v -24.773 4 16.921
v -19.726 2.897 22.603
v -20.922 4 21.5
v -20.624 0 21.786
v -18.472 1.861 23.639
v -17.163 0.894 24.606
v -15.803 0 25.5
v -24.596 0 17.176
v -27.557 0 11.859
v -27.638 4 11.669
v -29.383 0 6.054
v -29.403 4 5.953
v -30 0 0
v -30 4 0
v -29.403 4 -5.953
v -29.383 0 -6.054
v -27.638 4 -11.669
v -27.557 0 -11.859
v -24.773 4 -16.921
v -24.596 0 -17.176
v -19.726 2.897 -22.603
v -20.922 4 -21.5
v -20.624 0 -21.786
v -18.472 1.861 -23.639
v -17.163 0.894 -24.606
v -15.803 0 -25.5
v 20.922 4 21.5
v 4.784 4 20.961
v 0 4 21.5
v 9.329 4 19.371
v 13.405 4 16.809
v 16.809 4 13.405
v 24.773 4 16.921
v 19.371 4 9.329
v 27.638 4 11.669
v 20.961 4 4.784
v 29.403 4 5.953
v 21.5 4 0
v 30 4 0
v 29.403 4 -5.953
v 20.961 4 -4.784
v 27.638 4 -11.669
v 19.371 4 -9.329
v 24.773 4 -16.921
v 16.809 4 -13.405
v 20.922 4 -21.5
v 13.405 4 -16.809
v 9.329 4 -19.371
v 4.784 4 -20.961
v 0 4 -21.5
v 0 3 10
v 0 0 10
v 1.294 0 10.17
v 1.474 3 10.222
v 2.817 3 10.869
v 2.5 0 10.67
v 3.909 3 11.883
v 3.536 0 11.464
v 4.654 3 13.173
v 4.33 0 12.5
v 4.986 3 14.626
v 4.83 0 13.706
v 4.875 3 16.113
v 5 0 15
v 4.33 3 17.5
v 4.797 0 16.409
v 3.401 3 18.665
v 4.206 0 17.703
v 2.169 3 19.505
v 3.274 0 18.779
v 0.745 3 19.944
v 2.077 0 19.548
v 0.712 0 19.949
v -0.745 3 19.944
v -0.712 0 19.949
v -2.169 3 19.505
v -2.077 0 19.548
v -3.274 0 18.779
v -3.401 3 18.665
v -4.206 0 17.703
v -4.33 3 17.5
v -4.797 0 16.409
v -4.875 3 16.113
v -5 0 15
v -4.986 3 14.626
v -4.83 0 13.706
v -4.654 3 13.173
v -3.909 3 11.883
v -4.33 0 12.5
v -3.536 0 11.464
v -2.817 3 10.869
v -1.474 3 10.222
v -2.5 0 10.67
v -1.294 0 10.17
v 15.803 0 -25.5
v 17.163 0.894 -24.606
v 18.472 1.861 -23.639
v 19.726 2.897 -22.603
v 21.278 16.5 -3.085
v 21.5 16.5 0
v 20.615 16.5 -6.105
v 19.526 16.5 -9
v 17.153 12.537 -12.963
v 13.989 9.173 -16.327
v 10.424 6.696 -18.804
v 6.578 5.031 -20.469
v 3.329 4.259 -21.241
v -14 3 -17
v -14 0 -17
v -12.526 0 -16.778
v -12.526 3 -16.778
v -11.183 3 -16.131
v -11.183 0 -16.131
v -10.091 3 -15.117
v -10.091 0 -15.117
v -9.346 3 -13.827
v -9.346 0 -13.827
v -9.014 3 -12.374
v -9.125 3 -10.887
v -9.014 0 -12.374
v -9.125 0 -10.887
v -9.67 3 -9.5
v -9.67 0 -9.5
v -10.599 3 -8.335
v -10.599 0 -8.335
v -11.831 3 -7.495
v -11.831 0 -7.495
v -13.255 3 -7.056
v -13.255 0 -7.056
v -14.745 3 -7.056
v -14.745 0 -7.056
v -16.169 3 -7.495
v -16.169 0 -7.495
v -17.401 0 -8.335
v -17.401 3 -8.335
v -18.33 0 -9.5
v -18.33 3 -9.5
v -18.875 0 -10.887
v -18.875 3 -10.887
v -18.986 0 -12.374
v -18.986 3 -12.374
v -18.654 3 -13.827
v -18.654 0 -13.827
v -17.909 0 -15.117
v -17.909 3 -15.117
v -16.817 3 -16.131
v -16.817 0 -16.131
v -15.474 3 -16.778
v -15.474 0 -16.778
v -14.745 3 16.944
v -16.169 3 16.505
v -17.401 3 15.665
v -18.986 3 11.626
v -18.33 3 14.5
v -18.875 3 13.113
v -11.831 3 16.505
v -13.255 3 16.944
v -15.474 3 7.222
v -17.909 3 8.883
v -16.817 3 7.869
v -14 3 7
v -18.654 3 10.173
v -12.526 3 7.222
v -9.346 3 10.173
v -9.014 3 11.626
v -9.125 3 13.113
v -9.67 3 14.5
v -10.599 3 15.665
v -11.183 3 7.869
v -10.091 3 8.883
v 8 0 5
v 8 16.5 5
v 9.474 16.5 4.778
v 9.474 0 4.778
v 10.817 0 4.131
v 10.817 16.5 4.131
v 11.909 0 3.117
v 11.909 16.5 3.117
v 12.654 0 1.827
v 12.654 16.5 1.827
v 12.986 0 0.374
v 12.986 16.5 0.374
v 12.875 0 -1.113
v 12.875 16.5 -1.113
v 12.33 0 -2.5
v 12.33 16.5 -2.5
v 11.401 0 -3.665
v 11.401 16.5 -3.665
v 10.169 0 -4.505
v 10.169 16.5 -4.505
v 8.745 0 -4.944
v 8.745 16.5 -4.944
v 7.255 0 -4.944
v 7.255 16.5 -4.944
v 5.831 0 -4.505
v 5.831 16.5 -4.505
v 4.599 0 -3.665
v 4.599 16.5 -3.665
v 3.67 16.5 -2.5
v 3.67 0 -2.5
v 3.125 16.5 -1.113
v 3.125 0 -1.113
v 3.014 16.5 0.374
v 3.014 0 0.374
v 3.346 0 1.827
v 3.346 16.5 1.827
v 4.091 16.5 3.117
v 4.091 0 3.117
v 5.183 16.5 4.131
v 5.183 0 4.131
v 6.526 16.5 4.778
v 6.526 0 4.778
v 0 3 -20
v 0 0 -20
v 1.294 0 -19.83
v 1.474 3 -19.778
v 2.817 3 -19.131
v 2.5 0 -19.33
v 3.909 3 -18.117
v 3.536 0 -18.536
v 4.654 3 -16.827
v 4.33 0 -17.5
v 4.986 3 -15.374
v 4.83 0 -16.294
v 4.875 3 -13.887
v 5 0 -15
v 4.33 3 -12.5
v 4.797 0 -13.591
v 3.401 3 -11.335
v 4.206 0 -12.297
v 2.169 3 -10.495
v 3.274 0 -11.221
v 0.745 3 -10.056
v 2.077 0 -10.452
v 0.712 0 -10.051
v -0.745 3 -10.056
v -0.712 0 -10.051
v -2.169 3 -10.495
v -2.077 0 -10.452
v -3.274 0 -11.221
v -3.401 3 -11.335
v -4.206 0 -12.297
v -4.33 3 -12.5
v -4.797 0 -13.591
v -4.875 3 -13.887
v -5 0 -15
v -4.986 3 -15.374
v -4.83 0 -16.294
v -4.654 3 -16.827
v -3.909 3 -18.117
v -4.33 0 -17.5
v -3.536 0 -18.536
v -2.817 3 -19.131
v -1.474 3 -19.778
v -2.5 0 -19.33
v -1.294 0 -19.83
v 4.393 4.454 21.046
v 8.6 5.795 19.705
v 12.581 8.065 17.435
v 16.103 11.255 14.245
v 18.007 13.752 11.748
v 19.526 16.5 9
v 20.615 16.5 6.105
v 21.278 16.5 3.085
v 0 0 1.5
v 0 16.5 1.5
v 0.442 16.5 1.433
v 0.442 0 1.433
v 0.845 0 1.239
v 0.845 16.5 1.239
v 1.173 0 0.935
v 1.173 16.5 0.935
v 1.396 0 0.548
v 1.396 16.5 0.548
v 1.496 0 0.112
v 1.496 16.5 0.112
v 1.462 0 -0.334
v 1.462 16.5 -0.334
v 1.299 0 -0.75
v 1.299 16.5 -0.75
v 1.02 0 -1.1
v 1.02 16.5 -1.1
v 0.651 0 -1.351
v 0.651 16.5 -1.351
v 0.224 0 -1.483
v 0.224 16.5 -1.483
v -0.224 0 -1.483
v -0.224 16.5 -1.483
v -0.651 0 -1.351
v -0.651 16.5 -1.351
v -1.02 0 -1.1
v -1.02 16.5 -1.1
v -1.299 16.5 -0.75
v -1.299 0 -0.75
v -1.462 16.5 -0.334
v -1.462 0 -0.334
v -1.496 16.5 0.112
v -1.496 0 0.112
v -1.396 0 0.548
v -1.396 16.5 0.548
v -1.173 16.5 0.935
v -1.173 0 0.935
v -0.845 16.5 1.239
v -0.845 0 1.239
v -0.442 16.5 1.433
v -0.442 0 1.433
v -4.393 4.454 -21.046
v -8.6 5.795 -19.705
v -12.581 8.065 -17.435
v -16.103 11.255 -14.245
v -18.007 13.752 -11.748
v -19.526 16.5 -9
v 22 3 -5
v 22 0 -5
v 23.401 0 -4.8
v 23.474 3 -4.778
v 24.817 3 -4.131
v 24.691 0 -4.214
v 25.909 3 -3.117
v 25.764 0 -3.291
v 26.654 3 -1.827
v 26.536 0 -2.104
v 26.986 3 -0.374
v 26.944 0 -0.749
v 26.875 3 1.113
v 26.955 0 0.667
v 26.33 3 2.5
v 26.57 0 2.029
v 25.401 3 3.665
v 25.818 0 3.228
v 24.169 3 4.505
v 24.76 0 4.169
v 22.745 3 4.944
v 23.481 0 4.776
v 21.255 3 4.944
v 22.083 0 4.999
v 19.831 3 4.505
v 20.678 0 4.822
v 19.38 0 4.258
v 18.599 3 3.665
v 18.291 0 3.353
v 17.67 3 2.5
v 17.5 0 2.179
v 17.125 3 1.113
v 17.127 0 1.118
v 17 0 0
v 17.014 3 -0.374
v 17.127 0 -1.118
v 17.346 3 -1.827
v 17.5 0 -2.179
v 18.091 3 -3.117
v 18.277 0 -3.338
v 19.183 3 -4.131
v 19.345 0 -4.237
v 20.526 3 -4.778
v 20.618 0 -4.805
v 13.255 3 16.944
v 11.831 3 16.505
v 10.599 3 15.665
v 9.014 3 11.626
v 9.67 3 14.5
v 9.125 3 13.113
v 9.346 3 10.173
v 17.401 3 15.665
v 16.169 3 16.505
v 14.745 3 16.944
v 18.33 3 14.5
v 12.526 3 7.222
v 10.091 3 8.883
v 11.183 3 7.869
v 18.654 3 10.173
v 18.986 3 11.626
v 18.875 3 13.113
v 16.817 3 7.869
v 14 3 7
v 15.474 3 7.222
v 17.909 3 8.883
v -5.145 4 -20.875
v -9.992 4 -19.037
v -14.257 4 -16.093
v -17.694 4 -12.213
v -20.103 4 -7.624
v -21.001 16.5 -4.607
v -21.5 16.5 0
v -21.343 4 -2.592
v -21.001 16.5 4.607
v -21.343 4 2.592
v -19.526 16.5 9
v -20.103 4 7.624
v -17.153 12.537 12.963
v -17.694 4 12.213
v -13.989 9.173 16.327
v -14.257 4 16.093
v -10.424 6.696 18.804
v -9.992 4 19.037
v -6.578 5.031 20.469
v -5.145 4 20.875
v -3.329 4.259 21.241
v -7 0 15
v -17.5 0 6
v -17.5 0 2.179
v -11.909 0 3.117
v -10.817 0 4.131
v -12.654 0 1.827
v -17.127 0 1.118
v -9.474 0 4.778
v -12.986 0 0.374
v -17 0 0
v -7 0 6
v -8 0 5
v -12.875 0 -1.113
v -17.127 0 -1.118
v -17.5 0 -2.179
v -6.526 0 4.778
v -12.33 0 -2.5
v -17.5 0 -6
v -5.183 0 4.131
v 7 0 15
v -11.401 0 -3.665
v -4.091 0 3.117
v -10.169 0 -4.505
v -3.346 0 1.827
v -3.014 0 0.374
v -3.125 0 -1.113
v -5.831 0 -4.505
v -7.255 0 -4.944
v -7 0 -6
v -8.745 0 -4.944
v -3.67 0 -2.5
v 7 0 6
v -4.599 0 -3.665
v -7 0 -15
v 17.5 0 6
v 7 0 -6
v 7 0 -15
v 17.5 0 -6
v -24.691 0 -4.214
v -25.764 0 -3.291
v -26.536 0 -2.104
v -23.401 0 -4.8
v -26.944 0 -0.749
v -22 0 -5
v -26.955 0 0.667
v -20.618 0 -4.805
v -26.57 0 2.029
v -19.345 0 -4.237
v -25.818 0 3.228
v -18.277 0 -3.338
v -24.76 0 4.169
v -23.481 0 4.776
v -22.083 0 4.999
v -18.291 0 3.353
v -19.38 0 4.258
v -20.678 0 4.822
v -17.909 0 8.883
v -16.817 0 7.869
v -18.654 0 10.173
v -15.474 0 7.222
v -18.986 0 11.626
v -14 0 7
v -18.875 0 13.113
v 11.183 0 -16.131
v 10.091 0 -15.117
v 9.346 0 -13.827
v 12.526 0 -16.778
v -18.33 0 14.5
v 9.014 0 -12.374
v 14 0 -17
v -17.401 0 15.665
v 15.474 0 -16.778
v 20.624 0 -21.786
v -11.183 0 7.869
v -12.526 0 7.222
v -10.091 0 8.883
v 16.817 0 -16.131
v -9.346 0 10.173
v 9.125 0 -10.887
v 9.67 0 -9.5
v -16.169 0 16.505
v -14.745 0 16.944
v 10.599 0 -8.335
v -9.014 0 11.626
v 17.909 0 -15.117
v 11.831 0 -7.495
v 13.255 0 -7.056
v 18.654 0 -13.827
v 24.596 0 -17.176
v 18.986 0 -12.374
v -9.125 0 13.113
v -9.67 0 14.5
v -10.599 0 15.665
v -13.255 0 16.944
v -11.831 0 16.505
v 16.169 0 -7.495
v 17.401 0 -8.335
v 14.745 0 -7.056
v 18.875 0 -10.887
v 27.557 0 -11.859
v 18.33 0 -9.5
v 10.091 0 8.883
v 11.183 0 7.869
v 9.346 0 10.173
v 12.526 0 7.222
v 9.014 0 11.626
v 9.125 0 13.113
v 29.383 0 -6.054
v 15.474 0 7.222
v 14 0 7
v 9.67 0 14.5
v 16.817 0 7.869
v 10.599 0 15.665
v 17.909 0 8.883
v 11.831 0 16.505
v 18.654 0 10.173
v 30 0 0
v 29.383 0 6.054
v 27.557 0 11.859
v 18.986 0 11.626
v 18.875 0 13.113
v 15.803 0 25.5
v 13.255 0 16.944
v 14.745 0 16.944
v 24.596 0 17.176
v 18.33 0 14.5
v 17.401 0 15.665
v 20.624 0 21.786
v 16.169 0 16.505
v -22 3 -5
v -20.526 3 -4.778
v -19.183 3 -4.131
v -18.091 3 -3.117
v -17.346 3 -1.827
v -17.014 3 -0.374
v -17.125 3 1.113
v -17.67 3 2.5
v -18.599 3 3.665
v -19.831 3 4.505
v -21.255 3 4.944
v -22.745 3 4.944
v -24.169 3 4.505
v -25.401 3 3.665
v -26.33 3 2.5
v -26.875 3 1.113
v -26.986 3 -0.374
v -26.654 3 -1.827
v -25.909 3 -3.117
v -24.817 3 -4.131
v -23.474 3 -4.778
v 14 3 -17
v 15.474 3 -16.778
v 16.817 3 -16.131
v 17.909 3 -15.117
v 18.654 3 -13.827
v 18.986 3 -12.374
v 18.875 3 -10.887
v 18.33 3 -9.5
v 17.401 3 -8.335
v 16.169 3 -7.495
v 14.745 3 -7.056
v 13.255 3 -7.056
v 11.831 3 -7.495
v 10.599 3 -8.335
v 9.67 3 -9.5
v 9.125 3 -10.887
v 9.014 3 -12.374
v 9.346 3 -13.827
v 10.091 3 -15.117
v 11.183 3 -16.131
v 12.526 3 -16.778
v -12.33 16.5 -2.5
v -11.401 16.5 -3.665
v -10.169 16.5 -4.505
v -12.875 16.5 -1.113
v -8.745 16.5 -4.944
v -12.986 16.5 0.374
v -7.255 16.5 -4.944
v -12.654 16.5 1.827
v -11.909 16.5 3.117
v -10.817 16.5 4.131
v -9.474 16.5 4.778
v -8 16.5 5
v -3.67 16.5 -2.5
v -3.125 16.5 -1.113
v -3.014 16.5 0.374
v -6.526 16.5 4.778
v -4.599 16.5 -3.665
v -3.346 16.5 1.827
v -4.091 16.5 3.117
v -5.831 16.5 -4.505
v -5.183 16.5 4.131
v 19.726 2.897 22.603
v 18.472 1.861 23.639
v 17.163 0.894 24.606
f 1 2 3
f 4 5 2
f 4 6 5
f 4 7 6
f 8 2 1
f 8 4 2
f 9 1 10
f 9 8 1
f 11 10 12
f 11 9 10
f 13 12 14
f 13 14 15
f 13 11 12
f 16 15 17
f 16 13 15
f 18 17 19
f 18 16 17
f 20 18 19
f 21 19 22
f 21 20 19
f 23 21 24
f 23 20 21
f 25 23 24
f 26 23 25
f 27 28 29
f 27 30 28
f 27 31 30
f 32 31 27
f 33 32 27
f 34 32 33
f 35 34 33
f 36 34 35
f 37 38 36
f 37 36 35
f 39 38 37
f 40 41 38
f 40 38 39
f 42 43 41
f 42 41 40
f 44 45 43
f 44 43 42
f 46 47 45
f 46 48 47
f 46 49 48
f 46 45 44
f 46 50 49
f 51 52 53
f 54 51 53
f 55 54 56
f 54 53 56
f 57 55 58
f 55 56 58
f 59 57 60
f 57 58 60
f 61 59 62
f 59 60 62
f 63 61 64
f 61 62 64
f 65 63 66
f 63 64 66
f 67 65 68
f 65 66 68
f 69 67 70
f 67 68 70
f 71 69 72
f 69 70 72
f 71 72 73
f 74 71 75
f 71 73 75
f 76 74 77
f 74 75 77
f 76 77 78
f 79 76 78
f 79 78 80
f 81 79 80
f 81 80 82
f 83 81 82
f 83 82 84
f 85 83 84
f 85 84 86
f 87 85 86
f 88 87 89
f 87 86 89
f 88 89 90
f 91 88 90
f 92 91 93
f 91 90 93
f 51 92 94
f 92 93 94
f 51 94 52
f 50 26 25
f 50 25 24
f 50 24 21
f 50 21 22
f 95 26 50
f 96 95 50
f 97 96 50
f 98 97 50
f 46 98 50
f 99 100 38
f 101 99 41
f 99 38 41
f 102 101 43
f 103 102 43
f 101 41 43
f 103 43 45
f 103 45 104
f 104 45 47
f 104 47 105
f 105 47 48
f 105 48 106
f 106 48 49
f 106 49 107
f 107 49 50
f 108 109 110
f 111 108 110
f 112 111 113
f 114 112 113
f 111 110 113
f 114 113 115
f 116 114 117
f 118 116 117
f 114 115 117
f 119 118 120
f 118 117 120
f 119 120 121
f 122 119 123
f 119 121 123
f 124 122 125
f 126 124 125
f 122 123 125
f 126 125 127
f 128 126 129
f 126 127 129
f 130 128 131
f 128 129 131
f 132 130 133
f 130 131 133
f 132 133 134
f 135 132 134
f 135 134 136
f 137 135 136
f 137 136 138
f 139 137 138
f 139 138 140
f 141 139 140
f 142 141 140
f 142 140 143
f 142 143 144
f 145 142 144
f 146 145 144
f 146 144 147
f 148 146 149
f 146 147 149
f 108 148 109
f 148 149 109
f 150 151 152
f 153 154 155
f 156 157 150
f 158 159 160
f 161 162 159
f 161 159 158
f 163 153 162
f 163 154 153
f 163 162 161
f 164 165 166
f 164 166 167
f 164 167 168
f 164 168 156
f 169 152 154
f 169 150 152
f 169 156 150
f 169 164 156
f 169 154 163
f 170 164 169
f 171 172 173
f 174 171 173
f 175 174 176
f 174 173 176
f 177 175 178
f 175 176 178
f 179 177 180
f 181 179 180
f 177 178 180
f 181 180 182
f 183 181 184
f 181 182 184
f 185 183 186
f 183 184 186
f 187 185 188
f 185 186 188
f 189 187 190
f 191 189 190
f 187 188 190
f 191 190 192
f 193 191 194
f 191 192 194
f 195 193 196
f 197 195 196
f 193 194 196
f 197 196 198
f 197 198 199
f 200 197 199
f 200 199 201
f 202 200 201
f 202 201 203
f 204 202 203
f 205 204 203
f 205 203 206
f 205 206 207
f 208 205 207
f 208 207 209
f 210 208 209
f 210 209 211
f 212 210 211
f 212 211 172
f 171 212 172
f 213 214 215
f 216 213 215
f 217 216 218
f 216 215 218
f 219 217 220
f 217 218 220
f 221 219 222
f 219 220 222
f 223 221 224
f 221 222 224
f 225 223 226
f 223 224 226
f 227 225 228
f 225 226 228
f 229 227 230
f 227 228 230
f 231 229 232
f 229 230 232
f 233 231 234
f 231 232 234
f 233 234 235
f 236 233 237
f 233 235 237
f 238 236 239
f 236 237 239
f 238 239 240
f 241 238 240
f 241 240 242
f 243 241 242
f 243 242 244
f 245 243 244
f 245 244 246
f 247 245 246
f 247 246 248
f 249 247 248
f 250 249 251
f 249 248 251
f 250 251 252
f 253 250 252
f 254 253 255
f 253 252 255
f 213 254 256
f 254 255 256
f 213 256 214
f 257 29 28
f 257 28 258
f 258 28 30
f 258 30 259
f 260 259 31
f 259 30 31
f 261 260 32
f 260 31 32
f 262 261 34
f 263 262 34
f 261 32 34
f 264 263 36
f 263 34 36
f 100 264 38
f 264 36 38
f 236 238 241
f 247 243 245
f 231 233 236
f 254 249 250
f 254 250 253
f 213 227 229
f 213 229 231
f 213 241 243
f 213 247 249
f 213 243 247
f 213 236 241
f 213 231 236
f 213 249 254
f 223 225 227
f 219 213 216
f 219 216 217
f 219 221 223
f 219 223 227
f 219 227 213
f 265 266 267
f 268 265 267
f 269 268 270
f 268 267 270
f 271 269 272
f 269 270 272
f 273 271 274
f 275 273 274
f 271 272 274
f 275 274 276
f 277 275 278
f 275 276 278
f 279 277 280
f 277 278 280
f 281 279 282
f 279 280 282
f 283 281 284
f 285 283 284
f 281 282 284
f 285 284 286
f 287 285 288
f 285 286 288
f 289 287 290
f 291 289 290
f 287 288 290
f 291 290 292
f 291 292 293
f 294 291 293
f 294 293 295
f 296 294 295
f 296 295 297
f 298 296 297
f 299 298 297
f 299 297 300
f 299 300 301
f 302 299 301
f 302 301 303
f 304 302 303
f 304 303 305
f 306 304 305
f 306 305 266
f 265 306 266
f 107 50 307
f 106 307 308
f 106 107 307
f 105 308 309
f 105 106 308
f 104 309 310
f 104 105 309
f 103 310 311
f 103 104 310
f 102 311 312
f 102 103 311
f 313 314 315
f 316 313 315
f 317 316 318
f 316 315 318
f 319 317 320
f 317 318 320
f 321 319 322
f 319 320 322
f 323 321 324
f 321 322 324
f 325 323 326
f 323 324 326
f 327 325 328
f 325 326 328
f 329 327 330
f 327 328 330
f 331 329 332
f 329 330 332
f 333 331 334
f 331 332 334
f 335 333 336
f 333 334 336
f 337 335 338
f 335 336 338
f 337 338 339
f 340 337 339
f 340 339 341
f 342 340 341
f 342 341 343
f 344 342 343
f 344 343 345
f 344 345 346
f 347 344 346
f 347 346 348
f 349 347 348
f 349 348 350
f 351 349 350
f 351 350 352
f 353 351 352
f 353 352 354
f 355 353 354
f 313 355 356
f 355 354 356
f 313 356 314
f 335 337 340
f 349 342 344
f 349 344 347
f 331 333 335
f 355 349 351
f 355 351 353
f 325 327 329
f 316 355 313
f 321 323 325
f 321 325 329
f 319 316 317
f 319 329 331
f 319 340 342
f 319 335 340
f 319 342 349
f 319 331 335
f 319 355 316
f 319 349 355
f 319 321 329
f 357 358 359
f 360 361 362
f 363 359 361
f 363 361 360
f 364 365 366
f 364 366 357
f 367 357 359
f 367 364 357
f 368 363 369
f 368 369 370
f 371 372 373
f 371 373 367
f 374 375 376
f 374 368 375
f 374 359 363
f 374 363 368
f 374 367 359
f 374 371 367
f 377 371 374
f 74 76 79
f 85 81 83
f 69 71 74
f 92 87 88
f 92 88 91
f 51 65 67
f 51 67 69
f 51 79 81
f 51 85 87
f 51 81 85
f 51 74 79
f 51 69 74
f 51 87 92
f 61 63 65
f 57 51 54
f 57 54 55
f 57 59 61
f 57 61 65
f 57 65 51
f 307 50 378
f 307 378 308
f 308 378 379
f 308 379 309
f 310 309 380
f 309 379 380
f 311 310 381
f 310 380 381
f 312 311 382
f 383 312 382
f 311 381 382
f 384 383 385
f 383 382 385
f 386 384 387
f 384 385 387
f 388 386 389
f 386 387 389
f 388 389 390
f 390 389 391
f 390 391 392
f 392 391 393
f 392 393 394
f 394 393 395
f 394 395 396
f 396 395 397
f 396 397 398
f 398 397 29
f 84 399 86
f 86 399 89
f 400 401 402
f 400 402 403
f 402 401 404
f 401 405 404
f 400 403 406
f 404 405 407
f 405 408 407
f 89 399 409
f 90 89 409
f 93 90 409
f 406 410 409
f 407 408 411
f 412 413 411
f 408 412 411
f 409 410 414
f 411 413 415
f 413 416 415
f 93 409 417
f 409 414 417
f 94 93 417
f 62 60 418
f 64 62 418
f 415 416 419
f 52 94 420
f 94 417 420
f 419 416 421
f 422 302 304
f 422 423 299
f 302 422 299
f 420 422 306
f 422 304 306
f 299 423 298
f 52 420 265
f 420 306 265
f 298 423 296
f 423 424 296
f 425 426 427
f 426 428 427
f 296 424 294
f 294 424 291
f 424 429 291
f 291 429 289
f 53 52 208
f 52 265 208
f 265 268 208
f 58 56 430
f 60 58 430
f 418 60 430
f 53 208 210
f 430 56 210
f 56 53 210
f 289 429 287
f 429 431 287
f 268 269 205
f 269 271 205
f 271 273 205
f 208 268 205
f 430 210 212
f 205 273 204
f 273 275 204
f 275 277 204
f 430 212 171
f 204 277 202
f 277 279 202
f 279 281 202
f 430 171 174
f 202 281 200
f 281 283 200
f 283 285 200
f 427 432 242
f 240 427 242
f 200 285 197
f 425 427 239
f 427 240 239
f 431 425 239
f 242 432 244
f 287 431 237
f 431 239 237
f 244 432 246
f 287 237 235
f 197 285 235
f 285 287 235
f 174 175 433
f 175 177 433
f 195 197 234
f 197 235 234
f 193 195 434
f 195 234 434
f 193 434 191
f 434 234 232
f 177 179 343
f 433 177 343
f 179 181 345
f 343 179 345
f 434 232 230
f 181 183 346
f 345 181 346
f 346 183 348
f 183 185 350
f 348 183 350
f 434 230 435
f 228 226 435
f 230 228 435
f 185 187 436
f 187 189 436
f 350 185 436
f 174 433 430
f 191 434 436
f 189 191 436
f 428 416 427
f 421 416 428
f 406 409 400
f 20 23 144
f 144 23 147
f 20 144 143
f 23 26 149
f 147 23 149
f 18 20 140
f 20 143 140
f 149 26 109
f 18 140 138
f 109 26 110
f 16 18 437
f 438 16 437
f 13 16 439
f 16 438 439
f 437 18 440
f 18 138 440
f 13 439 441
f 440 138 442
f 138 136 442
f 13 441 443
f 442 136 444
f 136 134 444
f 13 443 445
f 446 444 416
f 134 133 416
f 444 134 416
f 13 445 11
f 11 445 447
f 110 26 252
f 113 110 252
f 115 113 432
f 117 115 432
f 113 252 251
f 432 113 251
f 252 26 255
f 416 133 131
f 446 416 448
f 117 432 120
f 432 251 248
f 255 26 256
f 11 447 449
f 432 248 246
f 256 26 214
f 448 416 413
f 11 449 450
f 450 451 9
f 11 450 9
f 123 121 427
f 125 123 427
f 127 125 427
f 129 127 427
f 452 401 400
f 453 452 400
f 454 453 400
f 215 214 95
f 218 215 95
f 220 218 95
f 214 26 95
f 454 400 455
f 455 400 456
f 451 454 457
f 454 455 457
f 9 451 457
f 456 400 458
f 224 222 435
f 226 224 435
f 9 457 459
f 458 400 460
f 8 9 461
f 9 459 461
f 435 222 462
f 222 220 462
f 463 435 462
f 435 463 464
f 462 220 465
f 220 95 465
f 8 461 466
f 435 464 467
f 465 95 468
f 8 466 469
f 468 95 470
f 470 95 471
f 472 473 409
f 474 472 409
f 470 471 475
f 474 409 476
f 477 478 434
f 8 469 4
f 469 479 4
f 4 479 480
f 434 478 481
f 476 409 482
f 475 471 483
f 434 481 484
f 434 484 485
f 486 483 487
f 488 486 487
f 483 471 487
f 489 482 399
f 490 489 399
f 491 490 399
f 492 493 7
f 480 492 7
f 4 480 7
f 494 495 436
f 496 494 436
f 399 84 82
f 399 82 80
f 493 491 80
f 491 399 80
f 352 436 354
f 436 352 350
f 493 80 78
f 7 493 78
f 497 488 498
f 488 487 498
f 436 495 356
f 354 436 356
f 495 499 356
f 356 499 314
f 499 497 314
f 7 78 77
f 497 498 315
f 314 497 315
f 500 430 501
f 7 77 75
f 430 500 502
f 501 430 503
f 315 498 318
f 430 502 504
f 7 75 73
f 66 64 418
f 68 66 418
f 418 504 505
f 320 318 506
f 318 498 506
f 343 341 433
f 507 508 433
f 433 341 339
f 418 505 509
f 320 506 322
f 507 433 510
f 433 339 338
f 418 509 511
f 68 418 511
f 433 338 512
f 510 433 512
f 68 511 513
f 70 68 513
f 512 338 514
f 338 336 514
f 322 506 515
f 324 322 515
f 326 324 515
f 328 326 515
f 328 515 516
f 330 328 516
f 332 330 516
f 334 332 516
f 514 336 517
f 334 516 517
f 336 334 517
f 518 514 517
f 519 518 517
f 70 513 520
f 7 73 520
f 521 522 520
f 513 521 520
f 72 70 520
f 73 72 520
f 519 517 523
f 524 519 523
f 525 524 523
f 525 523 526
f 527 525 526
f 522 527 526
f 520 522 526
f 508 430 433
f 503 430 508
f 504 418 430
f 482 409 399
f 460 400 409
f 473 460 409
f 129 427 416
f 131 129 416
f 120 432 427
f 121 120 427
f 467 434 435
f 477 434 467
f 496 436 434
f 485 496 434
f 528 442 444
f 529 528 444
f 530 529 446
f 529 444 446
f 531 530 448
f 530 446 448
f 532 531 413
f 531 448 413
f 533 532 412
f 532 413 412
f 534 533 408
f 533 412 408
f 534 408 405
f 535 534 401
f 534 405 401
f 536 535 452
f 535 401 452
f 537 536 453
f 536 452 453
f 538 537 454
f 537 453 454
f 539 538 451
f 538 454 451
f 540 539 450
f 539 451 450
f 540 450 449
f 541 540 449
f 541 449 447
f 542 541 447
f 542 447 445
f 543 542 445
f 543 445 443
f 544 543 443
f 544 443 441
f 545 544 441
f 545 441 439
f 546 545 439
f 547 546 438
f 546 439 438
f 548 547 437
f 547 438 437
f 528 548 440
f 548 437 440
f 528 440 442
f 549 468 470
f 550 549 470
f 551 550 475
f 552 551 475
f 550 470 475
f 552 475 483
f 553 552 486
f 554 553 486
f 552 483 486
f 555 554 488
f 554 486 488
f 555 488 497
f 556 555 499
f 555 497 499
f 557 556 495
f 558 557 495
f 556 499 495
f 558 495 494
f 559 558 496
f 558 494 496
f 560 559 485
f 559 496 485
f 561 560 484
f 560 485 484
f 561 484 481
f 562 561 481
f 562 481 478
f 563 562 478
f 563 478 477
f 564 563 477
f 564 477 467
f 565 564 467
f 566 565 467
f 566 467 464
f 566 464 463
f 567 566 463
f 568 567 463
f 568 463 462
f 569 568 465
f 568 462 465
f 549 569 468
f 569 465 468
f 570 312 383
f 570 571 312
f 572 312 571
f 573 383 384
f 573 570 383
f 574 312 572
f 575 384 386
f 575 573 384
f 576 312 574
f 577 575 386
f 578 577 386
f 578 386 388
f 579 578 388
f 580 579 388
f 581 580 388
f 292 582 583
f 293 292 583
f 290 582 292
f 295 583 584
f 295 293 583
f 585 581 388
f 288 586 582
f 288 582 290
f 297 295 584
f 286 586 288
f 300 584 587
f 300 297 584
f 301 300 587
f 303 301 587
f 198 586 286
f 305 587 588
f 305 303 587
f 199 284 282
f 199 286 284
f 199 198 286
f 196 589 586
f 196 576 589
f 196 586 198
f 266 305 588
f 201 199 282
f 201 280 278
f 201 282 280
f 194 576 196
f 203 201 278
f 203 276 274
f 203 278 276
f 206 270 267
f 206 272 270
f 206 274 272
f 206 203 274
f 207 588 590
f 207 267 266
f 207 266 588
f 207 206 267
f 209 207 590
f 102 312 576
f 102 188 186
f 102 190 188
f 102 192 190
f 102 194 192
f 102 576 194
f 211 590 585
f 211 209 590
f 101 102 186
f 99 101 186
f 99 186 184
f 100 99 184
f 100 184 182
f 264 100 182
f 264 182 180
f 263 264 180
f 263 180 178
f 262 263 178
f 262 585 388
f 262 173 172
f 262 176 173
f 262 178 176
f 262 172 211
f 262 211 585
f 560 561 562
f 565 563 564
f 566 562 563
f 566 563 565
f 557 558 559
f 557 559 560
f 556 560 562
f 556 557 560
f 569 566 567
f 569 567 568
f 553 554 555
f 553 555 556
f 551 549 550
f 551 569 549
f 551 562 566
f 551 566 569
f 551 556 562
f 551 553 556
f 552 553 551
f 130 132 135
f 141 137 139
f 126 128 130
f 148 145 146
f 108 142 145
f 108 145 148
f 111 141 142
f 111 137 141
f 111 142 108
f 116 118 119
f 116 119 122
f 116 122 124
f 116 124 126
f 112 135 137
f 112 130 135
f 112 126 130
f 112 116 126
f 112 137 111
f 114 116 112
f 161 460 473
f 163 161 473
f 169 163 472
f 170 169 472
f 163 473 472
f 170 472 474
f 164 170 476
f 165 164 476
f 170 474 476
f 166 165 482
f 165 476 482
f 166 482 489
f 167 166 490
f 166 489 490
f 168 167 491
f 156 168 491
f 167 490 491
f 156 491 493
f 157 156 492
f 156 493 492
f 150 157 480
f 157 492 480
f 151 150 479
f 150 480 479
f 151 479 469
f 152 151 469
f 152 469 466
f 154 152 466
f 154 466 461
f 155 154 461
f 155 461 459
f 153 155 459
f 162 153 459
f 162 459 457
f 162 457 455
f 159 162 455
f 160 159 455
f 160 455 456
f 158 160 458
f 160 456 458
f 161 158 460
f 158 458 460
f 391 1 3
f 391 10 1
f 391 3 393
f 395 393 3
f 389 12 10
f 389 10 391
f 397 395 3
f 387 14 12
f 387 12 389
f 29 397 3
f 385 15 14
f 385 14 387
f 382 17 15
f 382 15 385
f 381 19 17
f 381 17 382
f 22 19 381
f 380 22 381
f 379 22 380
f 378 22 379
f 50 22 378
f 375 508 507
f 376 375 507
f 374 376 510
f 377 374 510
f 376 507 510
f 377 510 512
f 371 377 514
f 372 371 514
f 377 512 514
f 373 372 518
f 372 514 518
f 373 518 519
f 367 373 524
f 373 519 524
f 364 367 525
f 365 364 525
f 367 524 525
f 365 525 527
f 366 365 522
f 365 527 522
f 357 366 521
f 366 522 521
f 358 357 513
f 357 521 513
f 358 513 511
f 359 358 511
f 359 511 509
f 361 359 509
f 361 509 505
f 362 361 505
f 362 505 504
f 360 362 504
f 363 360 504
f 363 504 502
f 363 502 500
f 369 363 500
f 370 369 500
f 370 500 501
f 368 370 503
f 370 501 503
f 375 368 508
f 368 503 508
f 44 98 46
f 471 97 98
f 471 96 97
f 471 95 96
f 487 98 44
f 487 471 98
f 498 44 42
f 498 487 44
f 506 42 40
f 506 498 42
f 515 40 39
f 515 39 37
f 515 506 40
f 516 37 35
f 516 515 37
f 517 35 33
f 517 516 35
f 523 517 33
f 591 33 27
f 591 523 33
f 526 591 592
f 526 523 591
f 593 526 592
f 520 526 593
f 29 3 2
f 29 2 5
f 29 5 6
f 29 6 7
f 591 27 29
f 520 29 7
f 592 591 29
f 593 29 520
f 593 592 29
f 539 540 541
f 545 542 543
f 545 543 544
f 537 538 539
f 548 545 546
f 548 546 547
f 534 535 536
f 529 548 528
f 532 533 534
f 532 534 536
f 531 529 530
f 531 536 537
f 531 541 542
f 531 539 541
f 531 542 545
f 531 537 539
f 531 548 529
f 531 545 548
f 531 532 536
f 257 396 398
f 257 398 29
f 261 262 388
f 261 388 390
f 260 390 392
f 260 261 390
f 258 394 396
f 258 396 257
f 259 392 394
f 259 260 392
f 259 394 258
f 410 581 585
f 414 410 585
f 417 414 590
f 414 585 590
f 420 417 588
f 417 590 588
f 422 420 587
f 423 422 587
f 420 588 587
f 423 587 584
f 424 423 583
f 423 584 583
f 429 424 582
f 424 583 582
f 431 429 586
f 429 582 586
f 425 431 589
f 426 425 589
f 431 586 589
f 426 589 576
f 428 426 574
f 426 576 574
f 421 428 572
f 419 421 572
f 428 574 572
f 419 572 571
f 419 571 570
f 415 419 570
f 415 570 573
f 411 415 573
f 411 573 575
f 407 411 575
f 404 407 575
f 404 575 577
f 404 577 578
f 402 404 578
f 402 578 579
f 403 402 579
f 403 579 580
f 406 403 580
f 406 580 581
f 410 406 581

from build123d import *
from build123d.topology import SkipClean

# Parameters (mm, degrees)
SKETCH1_R                            = 30
BOSS_EXTRUDE1_DEPTH                  = 4
BOSS_EXTRUDE2_REACH                  = 44.615
BOSS_EXTRUDE2_END_RADIUS             = 30
BOSS_EXTRUDE2_DIRECTION_2_REACH      = 44.615
BOSS_EXTRUDE2_DIRECTION_2_END_RADIUS = 30
SKETCH3_OUTSIDE_W                    = 78.092
SKETCH3_OUTSIDE_H                    = 69.092
SKETCH3_OUTSIDE_R                    = 21.5
CUT_EXTRUDE2_DEPTH                   = 12.5
BOSS_EXTRUDE3_DEPTH                  = 18
BOSS_EXTRUDE4_DEPTH                  = 15
BOSS_EXTRUDE5_DEPTH                  = 15
CUT_EXTRUDE3_DEPTH                   = 44.292609069
CUT_EXTRUDE3_DEPTH_BACK              = 44.292609069
SKETCH8_R                            = 2
CUT_EXTRUDE8_DEPTH                   = 48.077064479
CUT_EXTRUDE8_DEPTH_BACK              = 48.077064479
CUT_EXTRUDE9_DEPTH                   = 59.659818207
CUT_EXTRUDE11_DEPTH                  = 20
CUT_EXTRUDE12_DEPTH                  = 20
CUT_EXTRUDE13_DEPTH                  = 20
CUT_EXTRUDE14_DEPTH                  = 44.292609069
CUT_EXTRUDE14_DEPTH_BACK             = 44.292609069
SKETCH25_W                           = 66.075437062
SKETCH25_H                           = 20.142243048
SKETCH26_R                           = 5
CUT_EXTRUDE15_DEPTH                  = 24
SKETCH27_R                           = 1.5
CUT_EXTRUDE16_DEPTH                  = 30
SKETCH28_R                           = 5
CUT_EXTRUDE17_DEPTH                  = 3


with BuildPart() as part:
    # Sketch1 → Boss-Extrude1 (new body)
    with BuildSketch(Plane(origin=(0, 0, 0), x_dir=(1, 0, 0), z_dir=(0, 1, 0))):
        with Locations(Location((0, 0, 0), (0, 0, 270))):
            Circle(SKETCH1_R)
    extrude(amount=BOSS_EXTRUDE1_DEPTH)

    # Boss-Extrude2: up to this cylinder (the profile starts inside it)
    with SkipClean():  # the faces are left unmerged after this step: merging them gives an invalid solid
        boss_extrude2_end = Plane(origin=(0, 9.396175, 0), z_dir=(0, -1, 0)) * Cylinder(BOSS_EXTRUDE2_END_RADIUS, 150.23, mode=Mode.PRIVATE)
        # Sketch2 → Boss-Extrude2 (add, up to the surface)
        with BuildSketch(Plane(origin=(0, 0, 0), x_dir=(0, 0, -1), z_dir=(1, 0, 0)), mode=Mode.PRIVATE) as boss_extrude2_sk1:
            Polygon((0, 4), (21.5, 4), (9, 16.5), (-9, 16.5), (-21.5, 4), align=None)
        boss_extrude2_tool1 = extrude(boss_extrude2_sk1.sketch, amount=BOSS_EXTRUDE2_REACH, mode=Mode.PRIVATE) & boss_extrude2_end
        add(boss_extrude2_tool1.solids().sort_by_distance((0, 9.396175, 0))[0])

    # Boss-Extrude2 direction 2: up to this cylinder (the profile starts inside it)
    with SkipClean():  # the faces are left unmerged after this step: merging them gives an invalid solid
        boss_extrude2_direction_2_end = Plane(origin=(0, 9.396175, 0), z_dir=(0, -1, 0)) * Cylinder(BOSS_EXTRUDE2_DIRECTION_2_END_RADIUS, 150.23, mode=Mode.PRIVATE)
        # Sketch2 → Boss-Extrude2 direction 2 (add, up to the surface)
        with BuildSketch(Plane(origin=(0, 0, 0), x_dir=(0, 0, -1), z_dir=(1, 0, 0)), mode=Mode.PRIVATE) as boss_extrude2_direction_2_sk1:
            Polygon((0, 4), (21.5, 4), (9, 16.5), (-9, 16.5), (-21.5, 4), align=None)
        boss_extrude2_direction_2_tool1 = extrude(boss_extrude2_direction_2_sk1.sketch, amount=-BOSS_EXTRUDE2_DIRECTION_2_REACH, mode=Mode.PRIVATE) & boss_extrude2_direction_2_end
        add(boss_extrude2_direction_2_tool1.solids().sort_by_distance((0, 9.396175, 0))[0])

    # SurfaceCut1
    split(bisect_by=Plane(origin=(0, 12.75, -12.75), x_dir=(1, 0, 0), z_dir=(0, 0.7071067811865558, -0.7071067811865392)), keep=Keep.BOTTOM)

    # SurfaceCut2
    split(bisect_by=Plane(origin=(0, 12.75, 12.75), x_dir=(1, 0, 0), z_dir=(0, 0.7071067811865509, 0.7071067811865442)), keep=Keep.BOTTOM)

    # Sketch3 outside → Cut-Extrude2 (cut)
    with SkipClean():  # the faces are left unmerged after this step: merging them gives an invalid solid
        with BuildSketch(Plane(origin=(0, 4, 0), x_dir=(1, 0, 0), z_dir=(0, 1, 0))):
            Rectangle(SKETCH3_OUTSIDE_W, SKETCH3_OUTSIDE_H)
            Circle(SKETCH3_OUTSIDE_R, mode=Mode.SUBTRACT)
        extrude(amount=CUT_EXTRUDE2_DEPTH, mode=Mode.SUBTRACT)

    # Sketch5 → Boss-Extrude3 (add)
    with SkipClean():  # the faces are left unmerged after this step: merging them gives an invalid solid
        with BuildSketch(Plane(origin=(0, 0, 0), x_dir=(-1, 0, 0), z_dir=(0, -1, 0))):
            Polygon((0, -6), (-17.5, -6), (-17.5, 6), (17.5, 6), (17.5, -6), align=None)
        extrude(amount=BOSS_EXTRUDE3_DEPTH)

    # Sketch6 → Boss-Extrude4 (add)
    with SkipClean():  # the faces are left unmerged after this step: merging them gives an invalid solid
        with BuildSketch(Plane.XZ):
            Polygon((0, 15), (7, 15), (7, 6), (-7, 6), (-7, 15), align=None)
        extrude(amount=BOSS_EXTRUDE4_DEPTH)

    # Sketch7 → Boss-Extrude5 (add)
    with SkipClean():  # the faces are left unmerged after this step: merging them gives an invalid solid
        with BuildSketch(Plane.XZ):
            Polygon((0, -15), (7, -15), (7, -6), (-7, -6), (-7, -15), align=None)
        extrude(amount=BOSS_EXTRUDE5_DEPTH)

    # Sketch8 → Cut-Extrude3 (cut, two sides: drawn at the far end of the back side and taken through both)
    with SkipClean():  # the faces are left unmerged after this step: merging them gives an invalid solid
        with BuildSketch(Plane.XY.offset(-CUT_EXTRUDE3_DEPTH_BACK)):
            with Locations((-12.5, -12.5)):
                Circle(SKETCH8_R)
            with Locations((12.5, -12.5)):
                Circle(SKETCH8_R)
        extrude(amount=CUT_EXTRUDE3_DEPTH + CUT_EXTRUDE3_DEPTH_BACK, mode=Mode.SUBTRACT)

    # Sketch16 → Cut-Extrude8 (cut, two sides: drawn at the far end of the back side and taken through both)
    with SkipClean():  # the faces are left unmerged after this step: merging them gives an invalid solid
        with BuildSketch(Plane.XY.offset(6).offset(-CUT_EXTRUDE8_DEPTH_BACK)):
            Polygon((17.5, -18), (17.5, -14.5), (14, -18), align=None)
            Polygon((-17.5, -18), (-14, -18), (-17.5, -14.5), align=None)
        extrude(amount=CUT_EXTRUDE8_DEPTH + CUT_EXTRUDE8_DEPTH_BACK, mode=Mode.SUBTRACT)

    # Sketch17 → Cut-Extrude9 (cut, through all)
    with SkipClean():  # the faces are left unmerged after this step: merging them gives an invalid solid
        with BuildSketch(Plane(origin=(10.365975269, -9.674910251, -8.062425209), x_dir=(-0.3613483622370374, 0.337258471421235, -0.8693009171531012), z_dir=(0.6355070151731325, -0.5931398808282571, -0.49428323402354774))):
            Polygon((-2.372510104, -6.189601271), (7.980636686, -0.706686759), (7.980636686, -10.965829024), align=None)
        extrude(amount=CUT_EXTRUDE9_DEPTH, mode=Mode.SUBTRACT)

    # Sketch19 → Cut-Extrude11 (cut)
    with SkipClean():  # the faces are left unmerged after this step: merging them gives an invalid solid
        with BuildSketch(Plane(origin=(-10.365975269, -9.674910251, -8.062425209), x_dir=(0.3613483622370374, 0.33725847142123494, -0.8693009171531012), z_dir=(0.6355070151731324, 0.5931398808282571, 0.4942832340235476))):
            Polygon((-2.372510104, -6.189601271), (7.980636686, -10.965829024), (7.980636686, -0.706686759), align=None)
        extrude(amount=-CUT_EXTRUDE11_DEPTH, mode=Mode.SUBTRACT)

    # Sketch20 → Cut-Extrude12 (cut)
    with SkipClean():  # the faces are left unmerged after this step: merging them gives an invalid solid
        with BuildSketch(Plane(origin=(-10.365975269, -9.674910251, 8.062425209), x_dir=(-0.3613483622370374, -0.3372584714212349, -0.8693009171531013), z_dir=(0.6355070151731326, 0.593139880828257, -0.49428323402354757))):
            Polygon((2.372510104, -6.189601271), (-7.980636686, -0.706686759), (-7.980636686, -10.965829024), align=None)
        extrude(amount=-CUT_EXTRUDE12_DEPTH, mode=Mode.SUBTRACT)

    # Sketch21 → Cut-Extrude13 (cut)
    with SkipClean():  # the faces are left unmerged after this step: merging them gives an invalid solid
        with BuildSketch(Plane(origin=(10.365975269, -9.674910251, 8.062425209), x_dir=(-0.3613483622370374, 0.3372584714212349, 0.8693009171531013), z_dir=(-0.6355070151731326, 0.593139880828257, -0.49428323402354757))):
            Polygon((-2.372510104, -6.189601271), (7.980636686, -0.706686759), (7.980636686, -10.965829024), align=None)
        extrude(amount=-CUT_EXTRUDE13_DEPTH, mode=Mode.SUBTRACT)

    # Sketch25 → Cut-Extrude14 (cut, two sides: drawn at the far end of the back side and taken through both)
    with SkipClean():  # the faces are left unmerged after this step: merging them gives an invalid solid
        with BuildSketch(Plane.XY.offset(-CUT_EXTRUDE14_DEPTH_BACK)):
            with Locations((0, -10.071121524)):
                Rectangle(SKETCH25_W, SKETCH25_H)
        extrude(amount=CUT_EXTRUDE14_DEPTH + CUT_EXTRUDE14_DEPTH_BACK, mode=Mode.SUBTRACT)

    # Sketch26 → Cut-Extrude15 (cut)
    with SkipClean():  # the faces are left unmerged after this step: merging them gives an invalid solid
        with BuildSketch(Plane(origin=(0, 16.5, 0), x_dir=(1, 0, 0), z_dir=(0, 1, 0))):
            with Locations(Location((-8, 0, 0), (0, 0, 270))):
                Circle(SKETCH26_R)
            with Locations(Location((8, 0, 0), (0, 0, 270))):
                Circle(SKETCH26_R)
        extrude(amount=-CUT_EXTRUDE15_DEPTH, mode=Mode.SUBTRACT)

    # Sketch27 → Cut-Extrude16 (cut)
    with SkipClean():  # the faces are left unmerged after this step: merging them gives an invalid solid
        with BuildSketch(Plane(origin=(0, 16.5, 0), x_dir=(1, 0, 0), z_dir=(0, 1, 0))):
            with Locations(Location((0, 0, 0), (0, 0, 270))):
                Circle(SKETCH27_R)
        extrude(amount=-CUT_EXTRUDE16_DEPTH, mode=Mode.SUBTRACT)

    # Sketch28 → Cut-Extrude17 (cut)
    with SkipClean():  # the faces are left unmerged after this step: merging them gives an invalid solid
        with BuildSketch(Plane.XZ):
            with Locations(Location((0, -15, 0), (0, 0, 270))):
                Circle(SKETCH28_R)
            with Locations(Location((22, 0, 0), (0, 0, 270))):
                Circle(SKETCH28_R)
            with Locations(Location((0, 15, 0), (0, 0, 270))):
                Circle(SKETCH28_R)
            with Locations(Location((-22, 0, 0), (0, 0, 270))):
                Circle(SKETCH28_R)
            with Locations(Location((-14, 12, 0), (0, 0, 270))):
                Circle(SKETCH28_R)
            with Locations(Location((14, 12, 0), (0, 0, 270))):
                Circle(SKETCH28_R)
            with Locations(Location((14, -12, 0), (0, 0, 270))):
                Circle(SKETCH28_R)
            with Locations(Location((-14, -12, 0), (0, 0, 270))):
                Circle(SKETCH28_R)
        extrude(amount=-CUT_EXTRUDE17_DEPTH, mode=Mode.SUBTRACT)


solid = part.part
